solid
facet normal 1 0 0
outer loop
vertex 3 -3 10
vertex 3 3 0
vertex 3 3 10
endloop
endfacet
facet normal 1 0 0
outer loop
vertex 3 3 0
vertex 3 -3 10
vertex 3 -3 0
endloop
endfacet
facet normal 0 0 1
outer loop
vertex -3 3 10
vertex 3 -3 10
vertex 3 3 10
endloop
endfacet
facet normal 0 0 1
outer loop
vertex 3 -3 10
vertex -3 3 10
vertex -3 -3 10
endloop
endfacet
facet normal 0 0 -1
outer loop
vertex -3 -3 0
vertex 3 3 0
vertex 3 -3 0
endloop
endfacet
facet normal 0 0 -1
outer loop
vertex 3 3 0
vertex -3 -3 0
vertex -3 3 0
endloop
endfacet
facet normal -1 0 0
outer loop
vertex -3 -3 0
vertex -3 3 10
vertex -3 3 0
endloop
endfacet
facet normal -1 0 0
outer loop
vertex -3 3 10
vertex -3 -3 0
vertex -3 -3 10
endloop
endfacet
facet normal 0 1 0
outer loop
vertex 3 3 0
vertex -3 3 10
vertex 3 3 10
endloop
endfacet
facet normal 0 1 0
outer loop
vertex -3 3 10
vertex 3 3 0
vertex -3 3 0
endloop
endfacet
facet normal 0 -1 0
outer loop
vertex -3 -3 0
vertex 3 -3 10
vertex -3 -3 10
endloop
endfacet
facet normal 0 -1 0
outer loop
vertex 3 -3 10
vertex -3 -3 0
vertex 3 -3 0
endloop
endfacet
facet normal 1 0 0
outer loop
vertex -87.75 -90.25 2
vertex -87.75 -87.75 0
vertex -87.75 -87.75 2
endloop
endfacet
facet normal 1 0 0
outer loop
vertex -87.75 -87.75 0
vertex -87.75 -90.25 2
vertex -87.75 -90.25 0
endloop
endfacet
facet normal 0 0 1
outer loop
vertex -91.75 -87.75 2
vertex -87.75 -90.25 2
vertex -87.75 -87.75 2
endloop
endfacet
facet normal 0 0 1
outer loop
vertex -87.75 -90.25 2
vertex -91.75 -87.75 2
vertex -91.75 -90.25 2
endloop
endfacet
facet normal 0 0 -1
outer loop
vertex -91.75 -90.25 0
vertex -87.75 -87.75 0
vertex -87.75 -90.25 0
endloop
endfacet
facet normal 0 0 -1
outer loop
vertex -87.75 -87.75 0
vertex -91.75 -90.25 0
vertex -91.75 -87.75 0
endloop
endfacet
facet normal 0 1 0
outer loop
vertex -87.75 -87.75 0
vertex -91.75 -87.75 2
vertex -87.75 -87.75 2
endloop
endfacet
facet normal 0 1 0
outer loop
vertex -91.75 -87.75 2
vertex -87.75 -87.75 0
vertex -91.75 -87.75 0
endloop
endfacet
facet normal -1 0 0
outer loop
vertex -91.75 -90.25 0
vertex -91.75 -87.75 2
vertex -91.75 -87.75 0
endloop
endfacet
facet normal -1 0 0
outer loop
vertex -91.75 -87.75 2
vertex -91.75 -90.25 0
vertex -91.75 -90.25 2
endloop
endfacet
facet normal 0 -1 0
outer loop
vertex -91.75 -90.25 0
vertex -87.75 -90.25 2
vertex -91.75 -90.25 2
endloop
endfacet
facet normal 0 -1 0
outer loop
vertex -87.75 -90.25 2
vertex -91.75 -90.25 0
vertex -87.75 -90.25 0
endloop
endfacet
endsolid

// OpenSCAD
translate([0, 0, 5]) color([0,1,0,0.9]) cube([6, 6, 10], center=true);
translate([-88.0, -88.0, 1]) color([1,0,0]) cube([0.5, 0.5, 2], center=true);
translate([-88.5, -88.0, 1]) color([1,0,0]) cube([0.5, 0.5, 2], center=true);
translate([-89.0, -88.0, 1]) color([1,0,0]) cube([0.5, 0.5, 2], center=true);
translate([-89.5, -88.0, 1]) color([1,0,0]) cube([0.5, 0.5, 2], center=true);
translate([-90.0, -88.0, 1]) color([1,0,0]) cube([0.5, 0.5, 2], center=true);
translate([-90.5, -88.0, 1]) color([1,0,0]) cube([0.5, 0.5, 2], center=true);
translate([-91.0, -88.0, 1]) color([1,0,0]) cube([0.5, 0.5, 2], center=true);
translate([-91.5, -88.0, 1]) color([1,0,0]) cube([0.5, 0.5, 2], center=true);
translate([-88.0, -88.5, 1]) color([1,0,0]) cube([0.5, 0.5, 2], center=true);
translate([-88.5, -88.5, 1]) color([1,0,0]) cube([0.5, 0.5, 2], center=true);
translate([-89.0, -88.5, 1]) color([1,0,0]) cube([0.5, 0.5, 2], center=true);
translate([-89.5, -88.5, 1]) color([1,0,0]) cube([0.5, 0.5, 2], center=true);
translate([-90.0, -88.5, 1]) color([1,0,0]) cube([0.5, 0.5, 2], center=true);
translate([-90.5, -88.5, 1]) color([1,0,0]) cube([0.5, 0.5, 2], center=true);
translate([-91.0, -88.5, 1]) color([1,0,0]) cube([0.5, 0.5, 2], center=true);
translate([-91.5, -88.5, 1]) color([1,0,0]) cube([0.5, 0.5, 2], center=true);
translate([-88.0, -89.0, 1]) color([1,0,0]) cube([0.5, 0.5, 2], center=true);
translate([-88.5, -89.0, 1]) color([1,0,0]) cube([0.5, 0.5, 2], center=true);
translate([-89.0, -89.0, 1]) color([1,0,0]) cube([0.5, 0.5, 2], center=true);
translate([-89.5, -89.0, 1]) color([1,0,0]) cube([0.5, 0.5, 2], center=true);
translate([-90.0, -89.0, 1]) color([1,0,0]) cube([0.5, 0.5, 2], center=true);
translate([-90.5, -89.0, 1]) color([1,0,0]) cube([0.5, 0.5, 2], center=true);
translate([-91.0, -89.0, 1]) color([1,0,0]) cube([0.5, 0.5, 2], center=true);
translate([-91.5, -89.0, 1]) color([1,0,0]) cube([0.5, 0.5, 2], center=true);
translate([-88.0, -89.5, 1]) color([1,0,0]) cube([0.5, 0.5, 2], center=true);
translate([-88.5, -89.5, 1]) color([1,0,0]) cube([0.5, 0.5, 2], center=true);
translate([-89.0, -89.5, 1]) color([1,0,0]) cube([0.5, 0.5, 2], center=true);
translate([-89.5, -89.5, 1]) color([1,0,0]) cube([0.5, 0.5, 2], center=true);
translate([-90.0, -89.5, 1]) color([1,0,0]) cube([0.5, 0.5, 2], center=true);
translate([-90.5, -89.5, 1]) color([1,0,0]) cube([0.5, 0.5, 2], center=true);
translate([-91.0, -89.5, 1]) color([1,0,0]) cube([0.5, 0.5, 2], center=true);
translate([-91.5, -89.5, 1]) color([1,0,0]) cube([0.5, 0.5, 2], center=true);
translate([-88.0, -90.0, 1]) color([1,0,0]) cube([0.5, 0.5, 2], center=true);
translate([-88.5, -90.0, 1]) color([1,0,0]) cube([0.5, 0.5, 2], center=true);
translate([-89.0, -90.0, 1]) color([1,0,0]) cube([0.5, 0.5, 2], center=true);
translate([-89.5, -90.0, 1]) color([1,0,0]) cube([0.5, 0.5, 2], center=true);
translate([-90.0, -90.0, 1]) color([1,0,0]) cube([0.5, 0.5, 2], center=true);
translate([-90.5, -90.0, 1]) color([1,0,0]) cube([0.5, 0.5, 2], center=true);
translate([-91.0, -90.0, 1]) color([1,0,0]) cube([0.5, 0.5, 2], center=true);
translate([-91.5, -90.0, 1]) color([1,0,0]) cube([0.5, 0.5, 2], center=true);
